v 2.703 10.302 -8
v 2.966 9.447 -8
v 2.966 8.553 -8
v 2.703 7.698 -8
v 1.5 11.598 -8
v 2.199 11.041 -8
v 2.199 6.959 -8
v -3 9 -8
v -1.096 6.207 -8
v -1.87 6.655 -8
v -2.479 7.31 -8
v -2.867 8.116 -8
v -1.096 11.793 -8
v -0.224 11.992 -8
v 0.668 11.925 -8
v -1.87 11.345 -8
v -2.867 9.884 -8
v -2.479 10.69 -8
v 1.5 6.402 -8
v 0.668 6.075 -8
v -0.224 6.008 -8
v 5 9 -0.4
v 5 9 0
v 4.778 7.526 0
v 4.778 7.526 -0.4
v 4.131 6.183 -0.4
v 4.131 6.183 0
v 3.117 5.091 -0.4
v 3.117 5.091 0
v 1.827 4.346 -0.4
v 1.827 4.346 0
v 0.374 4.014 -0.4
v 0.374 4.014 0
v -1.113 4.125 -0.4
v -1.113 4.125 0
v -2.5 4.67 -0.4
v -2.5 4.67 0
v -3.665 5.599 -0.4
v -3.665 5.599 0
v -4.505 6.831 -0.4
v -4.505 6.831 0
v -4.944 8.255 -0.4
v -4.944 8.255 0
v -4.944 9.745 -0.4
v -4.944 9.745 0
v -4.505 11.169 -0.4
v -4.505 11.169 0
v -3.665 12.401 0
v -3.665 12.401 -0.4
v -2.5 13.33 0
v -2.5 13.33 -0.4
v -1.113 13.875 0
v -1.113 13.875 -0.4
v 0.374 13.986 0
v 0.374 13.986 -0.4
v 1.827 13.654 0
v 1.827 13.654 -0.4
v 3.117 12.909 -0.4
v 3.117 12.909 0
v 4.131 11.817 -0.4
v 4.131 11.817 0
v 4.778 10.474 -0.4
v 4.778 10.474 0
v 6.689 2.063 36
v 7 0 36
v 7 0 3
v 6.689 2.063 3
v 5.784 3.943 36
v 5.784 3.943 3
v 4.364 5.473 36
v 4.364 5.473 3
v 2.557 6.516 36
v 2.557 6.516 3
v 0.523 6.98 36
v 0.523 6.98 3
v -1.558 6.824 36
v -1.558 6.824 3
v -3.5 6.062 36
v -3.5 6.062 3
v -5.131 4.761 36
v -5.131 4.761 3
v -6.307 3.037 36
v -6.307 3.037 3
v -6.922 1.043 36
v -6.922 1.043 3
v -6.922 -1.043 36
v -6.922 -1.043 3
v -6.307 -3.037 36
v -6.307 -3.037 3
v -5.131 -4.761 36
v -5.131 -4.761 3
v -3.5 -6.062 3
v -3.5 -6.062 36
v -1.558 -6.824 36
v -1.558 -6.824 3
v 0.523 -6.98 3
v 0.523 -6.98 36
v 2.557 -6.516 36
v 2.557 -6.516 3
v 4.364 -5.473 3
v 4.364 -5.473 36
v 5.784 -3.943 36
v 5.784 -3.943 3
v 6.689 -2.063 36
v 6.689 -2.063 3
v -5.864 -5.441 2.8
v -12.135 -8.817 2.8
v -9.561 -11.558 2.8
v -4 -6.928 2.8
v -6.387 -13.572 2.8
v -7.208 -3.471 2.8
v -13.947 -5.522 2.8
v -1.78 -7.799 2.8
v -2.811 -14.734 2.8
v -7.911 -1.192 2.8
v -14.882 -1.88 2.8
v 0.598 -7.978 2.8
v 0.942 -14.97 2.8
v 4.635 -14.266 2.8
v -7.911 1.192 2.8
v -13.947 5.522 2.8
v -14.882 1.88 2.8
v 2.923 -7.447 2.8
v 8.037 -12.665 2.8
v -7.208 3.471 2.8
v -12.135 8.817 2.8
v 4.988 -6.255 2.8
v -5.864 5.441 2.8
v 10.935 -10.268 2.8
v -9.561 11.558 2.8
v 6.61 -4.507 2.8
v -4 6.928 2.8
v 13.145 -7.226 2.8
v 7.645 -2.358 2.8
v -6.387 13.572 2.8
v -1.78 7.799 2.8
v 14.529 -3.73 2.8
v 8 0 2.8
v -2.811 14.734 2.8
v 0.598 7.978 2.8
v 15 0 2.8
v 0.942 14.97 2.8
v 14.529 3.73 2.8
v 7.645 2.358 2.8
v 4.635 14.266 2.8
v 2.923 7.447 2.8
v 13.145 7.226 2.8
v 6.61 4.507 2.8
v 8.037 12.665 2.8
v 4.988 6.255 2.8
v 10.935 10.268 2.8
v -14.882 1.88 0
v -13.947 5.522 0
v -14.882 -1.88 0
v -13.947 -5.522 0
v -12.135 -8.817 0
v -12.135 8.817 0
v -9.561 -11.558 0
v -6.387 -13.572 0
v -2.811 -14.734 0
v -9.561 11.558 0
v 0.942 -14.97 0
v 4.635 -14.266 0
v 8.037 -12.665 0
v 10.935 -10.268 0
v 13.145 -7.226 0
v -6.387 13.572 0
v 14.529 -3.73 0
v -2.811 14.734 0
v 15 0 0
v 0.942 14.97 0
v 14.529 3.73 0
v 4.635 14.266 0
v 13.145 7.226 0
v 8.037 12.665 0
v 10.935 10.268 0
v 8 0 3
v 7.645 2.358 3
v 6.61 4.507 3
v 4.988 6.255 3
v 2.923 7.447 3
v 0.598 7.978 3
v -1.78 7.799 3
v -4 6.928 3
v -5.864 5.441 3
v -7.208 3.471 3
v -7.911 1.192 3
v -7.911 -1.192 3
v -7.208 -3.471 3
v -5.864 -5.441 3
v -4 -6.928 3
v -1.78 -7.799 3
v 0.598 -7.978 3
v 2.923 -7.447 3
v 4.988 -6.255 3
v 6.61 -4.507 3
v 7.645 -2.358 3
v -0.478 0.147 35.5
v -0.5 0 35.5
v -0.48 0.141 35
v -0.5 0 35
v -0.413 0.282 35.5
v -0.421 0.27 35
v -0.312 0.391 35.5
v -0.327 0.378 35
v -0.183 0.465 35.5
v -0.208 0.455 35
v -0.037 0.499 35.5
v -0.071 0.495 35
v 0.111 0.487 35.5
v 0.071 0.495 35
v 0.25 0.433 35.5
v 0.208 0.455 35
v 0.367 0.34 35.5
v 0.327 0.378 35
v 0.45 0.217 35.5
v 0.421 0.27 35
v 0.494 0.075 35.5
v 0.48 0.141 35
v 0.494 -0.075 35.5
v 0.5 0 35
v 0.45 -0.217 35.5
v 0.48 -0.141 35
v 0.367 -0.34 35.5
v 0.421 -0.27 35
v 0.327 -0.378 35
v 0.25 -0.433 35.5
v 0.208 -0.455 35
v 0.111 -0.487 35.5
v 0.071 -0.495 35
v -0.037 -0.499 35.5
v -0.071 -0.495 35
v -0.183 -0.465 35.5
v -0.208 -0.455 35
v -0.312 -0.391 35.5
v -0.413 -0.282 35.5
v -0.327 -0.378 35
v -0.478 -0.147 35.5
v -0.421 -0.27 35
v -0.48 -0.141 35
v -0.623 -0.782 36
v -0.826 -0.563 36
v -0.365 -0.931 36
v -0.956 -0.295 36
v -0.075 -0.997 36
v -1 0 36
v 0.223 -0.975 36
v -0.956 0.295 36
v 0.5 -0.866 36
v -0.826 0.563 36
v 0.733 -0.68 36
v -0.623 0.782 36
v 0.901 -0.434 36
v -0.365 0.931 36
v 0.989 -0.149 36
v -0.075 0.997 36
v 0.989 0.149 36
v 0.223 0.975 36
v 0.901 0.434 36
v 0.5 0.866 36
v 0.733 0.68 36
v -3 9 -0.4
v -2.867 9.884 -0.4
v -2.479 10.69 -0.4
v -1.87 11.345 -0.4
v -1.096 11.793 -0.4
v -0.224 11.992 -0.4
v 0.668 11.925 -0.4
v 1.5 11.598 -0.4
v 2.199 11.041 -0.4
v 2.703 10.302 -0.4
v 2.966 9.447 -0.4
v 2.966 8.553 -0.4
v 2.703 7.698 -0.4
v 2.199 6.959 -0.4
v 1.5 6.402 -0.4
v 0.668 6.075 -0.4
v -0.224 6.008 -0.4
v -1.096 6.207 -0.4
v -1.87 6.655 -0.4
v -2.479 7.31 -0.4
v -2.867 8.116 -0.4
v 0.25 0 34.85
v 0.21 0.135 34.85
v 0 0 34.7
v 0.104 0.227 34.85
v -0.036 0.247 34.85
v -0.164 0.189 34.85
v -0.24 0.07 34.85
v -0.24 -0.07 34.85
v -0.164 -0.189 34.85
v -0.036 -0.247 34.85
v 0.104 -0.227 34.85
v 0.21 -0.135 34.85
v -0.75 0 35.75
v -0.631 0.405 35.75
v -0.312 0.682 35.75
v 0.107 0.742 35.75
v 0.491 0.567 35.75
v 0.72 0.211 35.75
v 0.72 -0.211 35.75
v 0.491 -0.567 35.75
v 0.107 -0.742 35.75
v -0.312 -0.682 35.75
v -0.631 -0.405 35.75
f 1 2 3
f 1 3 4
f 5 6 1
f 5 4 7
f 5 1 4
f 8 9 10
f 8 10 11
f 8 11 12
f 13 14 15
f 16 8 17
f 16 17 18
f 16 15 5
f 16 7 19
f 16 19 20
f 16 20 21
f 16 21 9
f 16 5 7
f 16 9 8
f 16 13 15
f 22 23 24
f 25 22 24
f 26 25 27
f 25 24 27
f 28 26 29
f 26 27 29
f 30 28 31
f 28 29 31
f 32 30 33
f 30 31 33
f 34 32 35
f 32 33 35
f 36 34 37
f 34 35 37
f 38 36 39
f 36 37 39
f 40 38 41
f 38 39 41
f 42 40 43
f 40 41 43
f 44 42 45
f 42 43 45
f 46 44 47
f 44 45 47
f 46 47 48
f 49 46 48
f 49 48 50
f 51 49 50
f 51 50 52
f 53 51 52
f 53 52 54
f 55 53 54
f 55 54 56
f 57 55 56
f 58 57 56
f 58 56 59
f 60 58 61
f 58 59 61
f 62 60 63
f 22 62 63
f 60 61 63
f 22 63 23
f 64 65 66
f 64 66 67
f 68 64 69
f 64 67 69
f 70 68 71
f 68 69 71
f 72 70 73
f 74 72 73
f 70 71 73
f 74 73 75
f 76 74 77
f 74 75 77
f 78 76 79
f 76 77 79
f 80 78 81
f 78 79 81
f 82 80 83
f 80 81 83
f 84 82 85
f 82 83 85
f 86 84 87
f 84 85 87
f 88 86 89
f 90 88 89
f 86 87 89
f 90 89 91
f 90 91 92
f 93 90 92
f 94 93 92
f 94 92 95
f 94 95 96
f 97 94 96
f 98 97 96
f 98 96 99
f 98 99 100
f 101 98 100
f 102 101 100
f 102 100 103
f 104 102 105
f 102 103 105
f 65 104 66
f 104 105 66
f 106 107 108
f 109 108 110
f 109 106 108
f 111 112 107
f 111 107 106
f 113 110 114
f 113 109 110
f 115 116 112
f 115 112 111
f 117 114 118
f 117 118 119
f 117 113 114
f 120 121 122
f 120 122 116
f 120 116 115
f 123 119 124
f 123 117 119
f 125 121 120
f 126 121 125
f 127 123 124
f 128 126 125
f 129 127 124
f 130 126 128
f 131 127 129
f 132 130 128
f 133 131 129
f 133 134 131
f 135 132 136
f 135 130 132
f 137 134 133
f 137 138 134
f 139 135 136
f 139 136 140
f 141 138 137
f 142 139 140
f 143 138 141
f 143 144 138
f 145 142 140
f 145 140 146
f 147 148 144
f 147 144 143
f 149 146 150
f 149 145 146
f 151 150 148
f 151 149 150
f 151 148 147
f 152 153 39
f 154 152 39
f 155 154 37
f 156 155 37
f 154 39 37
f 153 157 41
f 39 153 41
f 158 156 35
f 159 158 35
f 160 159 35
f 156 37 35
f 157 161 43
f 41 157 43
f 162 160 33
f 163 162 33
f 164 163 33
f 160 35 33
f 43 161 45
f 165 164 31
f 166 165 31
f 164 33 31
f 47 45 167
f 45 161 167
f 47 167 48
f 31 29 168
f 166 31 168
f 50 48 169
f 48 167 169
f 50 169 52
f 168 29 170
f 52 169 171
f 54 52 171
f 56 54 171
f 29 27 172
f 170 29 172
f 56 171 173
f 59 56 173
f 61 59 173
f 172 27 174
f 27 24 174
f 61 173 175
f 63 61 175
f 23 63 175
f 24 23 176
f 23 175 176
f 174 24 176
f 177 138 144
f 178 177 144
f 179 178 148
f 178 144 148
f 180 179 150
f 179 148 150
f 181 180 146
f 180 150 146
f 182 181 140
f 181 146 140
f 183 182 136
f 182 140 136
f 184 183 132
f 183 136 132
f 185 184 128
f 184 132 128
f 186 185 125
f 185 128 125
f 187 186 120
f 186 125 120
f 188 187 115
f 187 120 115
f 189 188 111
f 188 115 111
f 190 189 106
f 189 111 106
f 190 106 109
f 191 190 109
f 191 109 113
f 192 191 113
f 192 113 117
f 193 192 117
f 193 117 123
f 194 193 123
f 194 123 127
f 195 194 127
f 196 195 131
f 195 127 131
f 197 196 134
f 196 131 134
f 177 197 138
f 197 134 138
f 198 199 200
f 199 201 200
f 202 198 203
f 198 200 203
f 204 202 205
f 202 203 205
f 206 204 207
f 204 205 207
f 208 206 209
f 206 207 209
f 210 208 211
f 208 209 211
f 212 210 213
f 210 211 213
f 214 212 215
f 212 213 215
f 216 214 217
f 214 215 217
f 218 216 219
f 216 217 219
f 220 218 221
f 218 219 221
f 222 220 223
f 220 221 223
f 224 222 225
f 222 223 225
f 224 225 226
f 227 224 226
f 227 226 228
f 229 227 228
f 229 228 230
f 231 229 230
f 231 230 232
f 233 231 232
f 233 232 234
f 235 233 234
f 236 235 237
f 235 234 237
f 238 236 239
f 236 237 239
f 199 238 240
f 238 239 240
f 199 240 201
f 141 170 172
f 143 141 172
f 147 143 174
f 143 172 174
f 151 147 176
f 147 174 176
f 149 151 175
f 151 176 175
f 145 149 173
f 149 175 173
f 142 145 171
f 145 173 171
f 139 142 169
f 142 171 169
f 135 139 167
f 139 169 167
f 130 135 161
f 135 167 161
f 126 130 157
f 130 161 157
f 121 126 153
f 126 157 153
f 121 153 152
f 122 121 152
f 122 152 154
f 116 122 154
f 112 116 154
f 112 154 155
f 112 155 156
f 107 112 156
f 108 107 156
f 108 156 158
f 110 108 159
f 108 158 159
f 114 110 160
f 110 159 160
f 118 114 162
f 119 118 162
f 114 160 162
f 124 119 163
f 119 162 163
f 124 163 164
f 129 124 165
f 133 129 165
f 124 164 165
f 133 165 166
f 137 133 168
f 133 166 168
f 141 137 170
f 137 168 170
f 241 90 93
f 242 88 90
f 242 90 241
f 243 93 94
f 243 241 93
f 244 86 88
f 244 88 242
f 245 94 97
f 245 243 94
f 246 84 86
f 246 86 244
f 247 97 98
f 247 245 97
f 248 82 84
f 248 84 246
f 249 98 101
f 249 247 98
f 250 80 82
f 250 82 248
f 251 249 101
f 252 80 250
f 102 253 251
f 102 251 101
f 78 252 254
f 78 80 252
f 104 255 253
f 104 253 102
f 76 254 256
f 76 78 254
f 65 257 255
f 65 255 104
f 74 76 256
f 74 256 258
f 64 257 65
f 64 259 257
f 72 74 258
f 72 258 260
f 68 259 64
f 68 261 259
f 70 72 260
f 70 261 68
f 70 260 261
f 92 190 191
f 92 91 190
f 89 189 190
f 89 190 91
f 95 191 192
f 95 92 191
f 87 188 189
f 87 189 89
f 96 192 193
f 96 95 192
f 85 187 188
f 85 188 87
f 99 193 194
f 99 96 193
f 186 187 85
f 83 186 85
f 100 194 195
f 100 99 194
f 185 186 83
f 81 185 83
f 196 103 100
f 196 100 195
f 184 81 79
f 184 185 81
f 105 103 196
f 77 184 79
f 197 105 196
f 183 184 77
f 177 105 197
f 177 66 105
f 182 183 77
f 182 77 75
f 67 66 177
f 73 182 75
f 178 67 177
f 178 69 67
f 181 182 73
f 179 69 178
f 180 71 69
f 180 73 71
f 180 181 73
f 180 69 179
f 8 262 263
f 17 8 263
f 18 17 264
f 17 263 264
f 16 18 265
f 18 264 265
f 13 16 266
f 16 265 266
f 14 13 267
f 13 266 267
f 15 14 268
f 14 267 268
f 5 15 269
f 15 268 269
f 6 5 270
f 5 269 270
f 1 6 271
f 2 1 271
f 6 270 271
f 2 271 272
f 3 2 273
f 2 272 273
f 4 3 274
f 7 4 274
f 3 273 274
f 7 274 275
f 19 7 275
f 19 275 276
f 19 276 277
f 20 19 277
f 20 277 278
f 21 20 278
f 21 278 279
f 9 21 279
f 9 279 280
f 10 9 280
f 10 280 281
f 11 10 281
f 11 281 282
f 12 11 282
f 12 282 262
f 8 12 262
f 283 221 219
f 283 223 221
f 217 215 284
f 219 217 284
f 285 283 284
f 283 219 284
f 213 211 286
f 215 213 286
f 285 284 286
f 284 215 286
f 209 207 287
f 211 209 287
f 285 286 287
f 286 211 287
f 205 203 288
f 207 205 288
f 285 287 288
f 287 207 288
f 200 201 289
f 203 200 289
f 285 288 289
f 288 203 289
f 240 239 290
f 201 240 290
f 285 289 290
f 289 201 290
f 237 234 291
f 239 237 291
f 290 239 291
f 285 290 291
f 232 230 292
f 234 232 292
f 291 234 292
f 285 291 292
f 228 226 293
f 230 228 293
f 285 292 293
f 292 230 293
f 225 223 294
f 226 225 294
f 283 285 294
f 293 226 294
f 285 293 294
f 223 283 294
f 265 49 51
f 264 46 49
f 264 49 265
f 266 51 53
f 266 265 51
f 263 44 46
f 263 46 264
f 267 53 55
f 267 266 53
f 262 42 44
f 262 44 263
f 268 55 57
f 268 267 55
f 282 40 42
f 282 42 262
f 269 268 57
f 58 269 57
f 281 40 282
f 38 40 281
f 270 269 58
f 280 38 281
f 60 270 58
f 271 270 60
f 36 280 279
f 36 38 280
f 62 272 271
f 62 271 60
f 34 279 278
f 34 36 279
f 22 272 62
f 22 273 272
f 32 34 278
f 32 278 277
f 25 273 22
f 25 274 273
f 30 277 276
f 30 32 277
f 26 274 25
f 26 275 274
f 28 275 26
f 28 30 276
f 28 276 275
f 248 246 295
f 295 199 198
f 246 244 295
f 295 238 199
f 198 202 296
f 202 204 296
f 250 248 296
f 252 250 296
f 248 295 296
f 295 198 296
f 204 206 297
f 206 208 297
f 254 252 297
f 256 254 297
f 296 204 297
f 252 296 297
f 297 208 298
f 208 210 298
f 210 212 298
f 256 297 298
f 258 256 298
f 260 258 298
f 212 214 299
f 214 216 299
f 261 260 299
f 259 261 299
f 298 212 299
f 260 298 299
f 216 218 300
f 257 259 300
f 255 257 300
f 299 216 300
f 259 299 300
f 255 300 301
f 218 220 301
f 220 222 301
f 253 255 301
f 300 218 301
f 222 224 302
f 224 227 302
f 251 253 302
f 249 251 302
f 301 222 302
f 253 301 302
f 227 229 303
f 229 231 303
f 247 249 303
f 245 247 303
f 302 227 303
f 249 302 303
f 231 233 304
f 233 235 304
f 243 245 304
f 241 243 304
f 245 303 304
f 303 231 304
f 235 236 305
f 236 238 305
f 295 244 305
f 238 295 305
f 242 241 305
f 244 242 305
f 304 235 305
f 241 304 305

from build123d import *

# Parameters (mm, degrees)
SKETCH1_R                                       = 15
BOSS_EXTRUDE1_DEPTH                             = 2.8
SKETCH3_R                                       = 8
BOSS_EXTRUDE3_DEPTH                             = 0.2
SKETCH2_R                                       = 7
BOSS_EXTRUDE2_DEPTH                             = 33
SKETCH4_R                                       = 5
BOSS_EXTRUDE4_DEPTH                             = 0.4
SKETCH5_R                                       = 3
BOSS_EXTRUDE5_DEPTH                             = 8
CSK_FOR_M2_OVAL_HEAD_MACHINE_SCREW1_D           = 1
CSK_FOR_M2_OVAL_HEAD_MACHINE_SCREW1_DEPTH       = 1
CSK_FOR_M2_OVAL_HEAD_MACHINE_SCREW1_CSINK_D     = 2
CSK_FOR_M2_OVAL_HEAD_MACHINE_SCREW1_CSINK_ANGLE = 90
CSK_FOR_M2_OVAL_HEAD_MACHINE_SCREW1_TIP         = 0.30043031


with BuildPart() as part:
    # Sketch1 → Boss-Extrude1 (new body)
    with BuildSketch(Plane.XY):
        Circle(SKETCH1_R)
    extrude(amount=BOSS_EXTRUDE1_DEPTH)

    # Sketch3 → Boss-Extrude3 (add)
    with BuildSketch(Plane.XY.offset(2.8)):
        Circle(SKETCH3_R)
    extrude(amount=BOSS_EXTRUDE3_DEPTH)

    # Sketch2 → Boss-Extrude2 (add)
    with BuildSketch(Plane.XY.offset(3)):
        Circle(SKETCH2_R)
    extrude(amount=BOSS_EXTRUDE2_DEPTH)

    # Sketch4 → Boss-Extrude4 (add)
    with BuildSketch(Plane(origin=(0, 0, 0), x_dir=(-1, 0, 0), z_dir=(0, 0, -1))):
        with Locations(Location((0, 9, 0), (0, 0, 180))):  # turned: the seam where the file's is
            Circle(SKETCH4_R)
    extrude(amount=BOSS_EXTRUDE4_DEPTH)

    # Sketch5 → Boss-Extrude5 (add)
    with BuildSketch(Plane(origin=(0, 0, 0), x_dir=(-1, 0, 0), z_dir=(0, 0, -1))):
        with Locations((0, 9)):
            Circle(SKETCH5_R)
    extrude(amount=BOSS_EXTRUDE5_DEPTH)

    # CSK for M2 Oval Head Machine Screw1
    with Locations(Plane.XY.offset(36)):
        with Locations((0, 0)):
            CounterSinkHole(CSK_FOR_M2_OVAL_HEAD_MACHINE_SCREW1_D / 2, CSK_FOR_M2_OVAL_HEAD_MACHINE_SCREW1_CSINK_D / 2, depth=CSK_FOR_M2_OVAL_HEAD_MACHINE_SCREW1_DEPTH, counter_sink_angle=CSK_FOR_M2_OVAL_HEAD_MACHINE_SCREW1_CSINK_ANGLE)
            with Locations((0, 0, -(CSK_FOR_M2_OVAL_HEAD_MACHINE_SCREW1_DEPTH + CSK_FOR_M2_OVAL_HEAD_MACHINE_SCREW1_TIP / 2))):  # 118° drill point
                Cone(0, CSK_FOR_M2_OVAL_HEAD_MACHINE_SCREW1_D / 2, CSK_FOR_M2_OVAL_HEAD_MACHINE_SCREW1_TIP, mode=Mode.SUBTRACT)


solid = part.part
